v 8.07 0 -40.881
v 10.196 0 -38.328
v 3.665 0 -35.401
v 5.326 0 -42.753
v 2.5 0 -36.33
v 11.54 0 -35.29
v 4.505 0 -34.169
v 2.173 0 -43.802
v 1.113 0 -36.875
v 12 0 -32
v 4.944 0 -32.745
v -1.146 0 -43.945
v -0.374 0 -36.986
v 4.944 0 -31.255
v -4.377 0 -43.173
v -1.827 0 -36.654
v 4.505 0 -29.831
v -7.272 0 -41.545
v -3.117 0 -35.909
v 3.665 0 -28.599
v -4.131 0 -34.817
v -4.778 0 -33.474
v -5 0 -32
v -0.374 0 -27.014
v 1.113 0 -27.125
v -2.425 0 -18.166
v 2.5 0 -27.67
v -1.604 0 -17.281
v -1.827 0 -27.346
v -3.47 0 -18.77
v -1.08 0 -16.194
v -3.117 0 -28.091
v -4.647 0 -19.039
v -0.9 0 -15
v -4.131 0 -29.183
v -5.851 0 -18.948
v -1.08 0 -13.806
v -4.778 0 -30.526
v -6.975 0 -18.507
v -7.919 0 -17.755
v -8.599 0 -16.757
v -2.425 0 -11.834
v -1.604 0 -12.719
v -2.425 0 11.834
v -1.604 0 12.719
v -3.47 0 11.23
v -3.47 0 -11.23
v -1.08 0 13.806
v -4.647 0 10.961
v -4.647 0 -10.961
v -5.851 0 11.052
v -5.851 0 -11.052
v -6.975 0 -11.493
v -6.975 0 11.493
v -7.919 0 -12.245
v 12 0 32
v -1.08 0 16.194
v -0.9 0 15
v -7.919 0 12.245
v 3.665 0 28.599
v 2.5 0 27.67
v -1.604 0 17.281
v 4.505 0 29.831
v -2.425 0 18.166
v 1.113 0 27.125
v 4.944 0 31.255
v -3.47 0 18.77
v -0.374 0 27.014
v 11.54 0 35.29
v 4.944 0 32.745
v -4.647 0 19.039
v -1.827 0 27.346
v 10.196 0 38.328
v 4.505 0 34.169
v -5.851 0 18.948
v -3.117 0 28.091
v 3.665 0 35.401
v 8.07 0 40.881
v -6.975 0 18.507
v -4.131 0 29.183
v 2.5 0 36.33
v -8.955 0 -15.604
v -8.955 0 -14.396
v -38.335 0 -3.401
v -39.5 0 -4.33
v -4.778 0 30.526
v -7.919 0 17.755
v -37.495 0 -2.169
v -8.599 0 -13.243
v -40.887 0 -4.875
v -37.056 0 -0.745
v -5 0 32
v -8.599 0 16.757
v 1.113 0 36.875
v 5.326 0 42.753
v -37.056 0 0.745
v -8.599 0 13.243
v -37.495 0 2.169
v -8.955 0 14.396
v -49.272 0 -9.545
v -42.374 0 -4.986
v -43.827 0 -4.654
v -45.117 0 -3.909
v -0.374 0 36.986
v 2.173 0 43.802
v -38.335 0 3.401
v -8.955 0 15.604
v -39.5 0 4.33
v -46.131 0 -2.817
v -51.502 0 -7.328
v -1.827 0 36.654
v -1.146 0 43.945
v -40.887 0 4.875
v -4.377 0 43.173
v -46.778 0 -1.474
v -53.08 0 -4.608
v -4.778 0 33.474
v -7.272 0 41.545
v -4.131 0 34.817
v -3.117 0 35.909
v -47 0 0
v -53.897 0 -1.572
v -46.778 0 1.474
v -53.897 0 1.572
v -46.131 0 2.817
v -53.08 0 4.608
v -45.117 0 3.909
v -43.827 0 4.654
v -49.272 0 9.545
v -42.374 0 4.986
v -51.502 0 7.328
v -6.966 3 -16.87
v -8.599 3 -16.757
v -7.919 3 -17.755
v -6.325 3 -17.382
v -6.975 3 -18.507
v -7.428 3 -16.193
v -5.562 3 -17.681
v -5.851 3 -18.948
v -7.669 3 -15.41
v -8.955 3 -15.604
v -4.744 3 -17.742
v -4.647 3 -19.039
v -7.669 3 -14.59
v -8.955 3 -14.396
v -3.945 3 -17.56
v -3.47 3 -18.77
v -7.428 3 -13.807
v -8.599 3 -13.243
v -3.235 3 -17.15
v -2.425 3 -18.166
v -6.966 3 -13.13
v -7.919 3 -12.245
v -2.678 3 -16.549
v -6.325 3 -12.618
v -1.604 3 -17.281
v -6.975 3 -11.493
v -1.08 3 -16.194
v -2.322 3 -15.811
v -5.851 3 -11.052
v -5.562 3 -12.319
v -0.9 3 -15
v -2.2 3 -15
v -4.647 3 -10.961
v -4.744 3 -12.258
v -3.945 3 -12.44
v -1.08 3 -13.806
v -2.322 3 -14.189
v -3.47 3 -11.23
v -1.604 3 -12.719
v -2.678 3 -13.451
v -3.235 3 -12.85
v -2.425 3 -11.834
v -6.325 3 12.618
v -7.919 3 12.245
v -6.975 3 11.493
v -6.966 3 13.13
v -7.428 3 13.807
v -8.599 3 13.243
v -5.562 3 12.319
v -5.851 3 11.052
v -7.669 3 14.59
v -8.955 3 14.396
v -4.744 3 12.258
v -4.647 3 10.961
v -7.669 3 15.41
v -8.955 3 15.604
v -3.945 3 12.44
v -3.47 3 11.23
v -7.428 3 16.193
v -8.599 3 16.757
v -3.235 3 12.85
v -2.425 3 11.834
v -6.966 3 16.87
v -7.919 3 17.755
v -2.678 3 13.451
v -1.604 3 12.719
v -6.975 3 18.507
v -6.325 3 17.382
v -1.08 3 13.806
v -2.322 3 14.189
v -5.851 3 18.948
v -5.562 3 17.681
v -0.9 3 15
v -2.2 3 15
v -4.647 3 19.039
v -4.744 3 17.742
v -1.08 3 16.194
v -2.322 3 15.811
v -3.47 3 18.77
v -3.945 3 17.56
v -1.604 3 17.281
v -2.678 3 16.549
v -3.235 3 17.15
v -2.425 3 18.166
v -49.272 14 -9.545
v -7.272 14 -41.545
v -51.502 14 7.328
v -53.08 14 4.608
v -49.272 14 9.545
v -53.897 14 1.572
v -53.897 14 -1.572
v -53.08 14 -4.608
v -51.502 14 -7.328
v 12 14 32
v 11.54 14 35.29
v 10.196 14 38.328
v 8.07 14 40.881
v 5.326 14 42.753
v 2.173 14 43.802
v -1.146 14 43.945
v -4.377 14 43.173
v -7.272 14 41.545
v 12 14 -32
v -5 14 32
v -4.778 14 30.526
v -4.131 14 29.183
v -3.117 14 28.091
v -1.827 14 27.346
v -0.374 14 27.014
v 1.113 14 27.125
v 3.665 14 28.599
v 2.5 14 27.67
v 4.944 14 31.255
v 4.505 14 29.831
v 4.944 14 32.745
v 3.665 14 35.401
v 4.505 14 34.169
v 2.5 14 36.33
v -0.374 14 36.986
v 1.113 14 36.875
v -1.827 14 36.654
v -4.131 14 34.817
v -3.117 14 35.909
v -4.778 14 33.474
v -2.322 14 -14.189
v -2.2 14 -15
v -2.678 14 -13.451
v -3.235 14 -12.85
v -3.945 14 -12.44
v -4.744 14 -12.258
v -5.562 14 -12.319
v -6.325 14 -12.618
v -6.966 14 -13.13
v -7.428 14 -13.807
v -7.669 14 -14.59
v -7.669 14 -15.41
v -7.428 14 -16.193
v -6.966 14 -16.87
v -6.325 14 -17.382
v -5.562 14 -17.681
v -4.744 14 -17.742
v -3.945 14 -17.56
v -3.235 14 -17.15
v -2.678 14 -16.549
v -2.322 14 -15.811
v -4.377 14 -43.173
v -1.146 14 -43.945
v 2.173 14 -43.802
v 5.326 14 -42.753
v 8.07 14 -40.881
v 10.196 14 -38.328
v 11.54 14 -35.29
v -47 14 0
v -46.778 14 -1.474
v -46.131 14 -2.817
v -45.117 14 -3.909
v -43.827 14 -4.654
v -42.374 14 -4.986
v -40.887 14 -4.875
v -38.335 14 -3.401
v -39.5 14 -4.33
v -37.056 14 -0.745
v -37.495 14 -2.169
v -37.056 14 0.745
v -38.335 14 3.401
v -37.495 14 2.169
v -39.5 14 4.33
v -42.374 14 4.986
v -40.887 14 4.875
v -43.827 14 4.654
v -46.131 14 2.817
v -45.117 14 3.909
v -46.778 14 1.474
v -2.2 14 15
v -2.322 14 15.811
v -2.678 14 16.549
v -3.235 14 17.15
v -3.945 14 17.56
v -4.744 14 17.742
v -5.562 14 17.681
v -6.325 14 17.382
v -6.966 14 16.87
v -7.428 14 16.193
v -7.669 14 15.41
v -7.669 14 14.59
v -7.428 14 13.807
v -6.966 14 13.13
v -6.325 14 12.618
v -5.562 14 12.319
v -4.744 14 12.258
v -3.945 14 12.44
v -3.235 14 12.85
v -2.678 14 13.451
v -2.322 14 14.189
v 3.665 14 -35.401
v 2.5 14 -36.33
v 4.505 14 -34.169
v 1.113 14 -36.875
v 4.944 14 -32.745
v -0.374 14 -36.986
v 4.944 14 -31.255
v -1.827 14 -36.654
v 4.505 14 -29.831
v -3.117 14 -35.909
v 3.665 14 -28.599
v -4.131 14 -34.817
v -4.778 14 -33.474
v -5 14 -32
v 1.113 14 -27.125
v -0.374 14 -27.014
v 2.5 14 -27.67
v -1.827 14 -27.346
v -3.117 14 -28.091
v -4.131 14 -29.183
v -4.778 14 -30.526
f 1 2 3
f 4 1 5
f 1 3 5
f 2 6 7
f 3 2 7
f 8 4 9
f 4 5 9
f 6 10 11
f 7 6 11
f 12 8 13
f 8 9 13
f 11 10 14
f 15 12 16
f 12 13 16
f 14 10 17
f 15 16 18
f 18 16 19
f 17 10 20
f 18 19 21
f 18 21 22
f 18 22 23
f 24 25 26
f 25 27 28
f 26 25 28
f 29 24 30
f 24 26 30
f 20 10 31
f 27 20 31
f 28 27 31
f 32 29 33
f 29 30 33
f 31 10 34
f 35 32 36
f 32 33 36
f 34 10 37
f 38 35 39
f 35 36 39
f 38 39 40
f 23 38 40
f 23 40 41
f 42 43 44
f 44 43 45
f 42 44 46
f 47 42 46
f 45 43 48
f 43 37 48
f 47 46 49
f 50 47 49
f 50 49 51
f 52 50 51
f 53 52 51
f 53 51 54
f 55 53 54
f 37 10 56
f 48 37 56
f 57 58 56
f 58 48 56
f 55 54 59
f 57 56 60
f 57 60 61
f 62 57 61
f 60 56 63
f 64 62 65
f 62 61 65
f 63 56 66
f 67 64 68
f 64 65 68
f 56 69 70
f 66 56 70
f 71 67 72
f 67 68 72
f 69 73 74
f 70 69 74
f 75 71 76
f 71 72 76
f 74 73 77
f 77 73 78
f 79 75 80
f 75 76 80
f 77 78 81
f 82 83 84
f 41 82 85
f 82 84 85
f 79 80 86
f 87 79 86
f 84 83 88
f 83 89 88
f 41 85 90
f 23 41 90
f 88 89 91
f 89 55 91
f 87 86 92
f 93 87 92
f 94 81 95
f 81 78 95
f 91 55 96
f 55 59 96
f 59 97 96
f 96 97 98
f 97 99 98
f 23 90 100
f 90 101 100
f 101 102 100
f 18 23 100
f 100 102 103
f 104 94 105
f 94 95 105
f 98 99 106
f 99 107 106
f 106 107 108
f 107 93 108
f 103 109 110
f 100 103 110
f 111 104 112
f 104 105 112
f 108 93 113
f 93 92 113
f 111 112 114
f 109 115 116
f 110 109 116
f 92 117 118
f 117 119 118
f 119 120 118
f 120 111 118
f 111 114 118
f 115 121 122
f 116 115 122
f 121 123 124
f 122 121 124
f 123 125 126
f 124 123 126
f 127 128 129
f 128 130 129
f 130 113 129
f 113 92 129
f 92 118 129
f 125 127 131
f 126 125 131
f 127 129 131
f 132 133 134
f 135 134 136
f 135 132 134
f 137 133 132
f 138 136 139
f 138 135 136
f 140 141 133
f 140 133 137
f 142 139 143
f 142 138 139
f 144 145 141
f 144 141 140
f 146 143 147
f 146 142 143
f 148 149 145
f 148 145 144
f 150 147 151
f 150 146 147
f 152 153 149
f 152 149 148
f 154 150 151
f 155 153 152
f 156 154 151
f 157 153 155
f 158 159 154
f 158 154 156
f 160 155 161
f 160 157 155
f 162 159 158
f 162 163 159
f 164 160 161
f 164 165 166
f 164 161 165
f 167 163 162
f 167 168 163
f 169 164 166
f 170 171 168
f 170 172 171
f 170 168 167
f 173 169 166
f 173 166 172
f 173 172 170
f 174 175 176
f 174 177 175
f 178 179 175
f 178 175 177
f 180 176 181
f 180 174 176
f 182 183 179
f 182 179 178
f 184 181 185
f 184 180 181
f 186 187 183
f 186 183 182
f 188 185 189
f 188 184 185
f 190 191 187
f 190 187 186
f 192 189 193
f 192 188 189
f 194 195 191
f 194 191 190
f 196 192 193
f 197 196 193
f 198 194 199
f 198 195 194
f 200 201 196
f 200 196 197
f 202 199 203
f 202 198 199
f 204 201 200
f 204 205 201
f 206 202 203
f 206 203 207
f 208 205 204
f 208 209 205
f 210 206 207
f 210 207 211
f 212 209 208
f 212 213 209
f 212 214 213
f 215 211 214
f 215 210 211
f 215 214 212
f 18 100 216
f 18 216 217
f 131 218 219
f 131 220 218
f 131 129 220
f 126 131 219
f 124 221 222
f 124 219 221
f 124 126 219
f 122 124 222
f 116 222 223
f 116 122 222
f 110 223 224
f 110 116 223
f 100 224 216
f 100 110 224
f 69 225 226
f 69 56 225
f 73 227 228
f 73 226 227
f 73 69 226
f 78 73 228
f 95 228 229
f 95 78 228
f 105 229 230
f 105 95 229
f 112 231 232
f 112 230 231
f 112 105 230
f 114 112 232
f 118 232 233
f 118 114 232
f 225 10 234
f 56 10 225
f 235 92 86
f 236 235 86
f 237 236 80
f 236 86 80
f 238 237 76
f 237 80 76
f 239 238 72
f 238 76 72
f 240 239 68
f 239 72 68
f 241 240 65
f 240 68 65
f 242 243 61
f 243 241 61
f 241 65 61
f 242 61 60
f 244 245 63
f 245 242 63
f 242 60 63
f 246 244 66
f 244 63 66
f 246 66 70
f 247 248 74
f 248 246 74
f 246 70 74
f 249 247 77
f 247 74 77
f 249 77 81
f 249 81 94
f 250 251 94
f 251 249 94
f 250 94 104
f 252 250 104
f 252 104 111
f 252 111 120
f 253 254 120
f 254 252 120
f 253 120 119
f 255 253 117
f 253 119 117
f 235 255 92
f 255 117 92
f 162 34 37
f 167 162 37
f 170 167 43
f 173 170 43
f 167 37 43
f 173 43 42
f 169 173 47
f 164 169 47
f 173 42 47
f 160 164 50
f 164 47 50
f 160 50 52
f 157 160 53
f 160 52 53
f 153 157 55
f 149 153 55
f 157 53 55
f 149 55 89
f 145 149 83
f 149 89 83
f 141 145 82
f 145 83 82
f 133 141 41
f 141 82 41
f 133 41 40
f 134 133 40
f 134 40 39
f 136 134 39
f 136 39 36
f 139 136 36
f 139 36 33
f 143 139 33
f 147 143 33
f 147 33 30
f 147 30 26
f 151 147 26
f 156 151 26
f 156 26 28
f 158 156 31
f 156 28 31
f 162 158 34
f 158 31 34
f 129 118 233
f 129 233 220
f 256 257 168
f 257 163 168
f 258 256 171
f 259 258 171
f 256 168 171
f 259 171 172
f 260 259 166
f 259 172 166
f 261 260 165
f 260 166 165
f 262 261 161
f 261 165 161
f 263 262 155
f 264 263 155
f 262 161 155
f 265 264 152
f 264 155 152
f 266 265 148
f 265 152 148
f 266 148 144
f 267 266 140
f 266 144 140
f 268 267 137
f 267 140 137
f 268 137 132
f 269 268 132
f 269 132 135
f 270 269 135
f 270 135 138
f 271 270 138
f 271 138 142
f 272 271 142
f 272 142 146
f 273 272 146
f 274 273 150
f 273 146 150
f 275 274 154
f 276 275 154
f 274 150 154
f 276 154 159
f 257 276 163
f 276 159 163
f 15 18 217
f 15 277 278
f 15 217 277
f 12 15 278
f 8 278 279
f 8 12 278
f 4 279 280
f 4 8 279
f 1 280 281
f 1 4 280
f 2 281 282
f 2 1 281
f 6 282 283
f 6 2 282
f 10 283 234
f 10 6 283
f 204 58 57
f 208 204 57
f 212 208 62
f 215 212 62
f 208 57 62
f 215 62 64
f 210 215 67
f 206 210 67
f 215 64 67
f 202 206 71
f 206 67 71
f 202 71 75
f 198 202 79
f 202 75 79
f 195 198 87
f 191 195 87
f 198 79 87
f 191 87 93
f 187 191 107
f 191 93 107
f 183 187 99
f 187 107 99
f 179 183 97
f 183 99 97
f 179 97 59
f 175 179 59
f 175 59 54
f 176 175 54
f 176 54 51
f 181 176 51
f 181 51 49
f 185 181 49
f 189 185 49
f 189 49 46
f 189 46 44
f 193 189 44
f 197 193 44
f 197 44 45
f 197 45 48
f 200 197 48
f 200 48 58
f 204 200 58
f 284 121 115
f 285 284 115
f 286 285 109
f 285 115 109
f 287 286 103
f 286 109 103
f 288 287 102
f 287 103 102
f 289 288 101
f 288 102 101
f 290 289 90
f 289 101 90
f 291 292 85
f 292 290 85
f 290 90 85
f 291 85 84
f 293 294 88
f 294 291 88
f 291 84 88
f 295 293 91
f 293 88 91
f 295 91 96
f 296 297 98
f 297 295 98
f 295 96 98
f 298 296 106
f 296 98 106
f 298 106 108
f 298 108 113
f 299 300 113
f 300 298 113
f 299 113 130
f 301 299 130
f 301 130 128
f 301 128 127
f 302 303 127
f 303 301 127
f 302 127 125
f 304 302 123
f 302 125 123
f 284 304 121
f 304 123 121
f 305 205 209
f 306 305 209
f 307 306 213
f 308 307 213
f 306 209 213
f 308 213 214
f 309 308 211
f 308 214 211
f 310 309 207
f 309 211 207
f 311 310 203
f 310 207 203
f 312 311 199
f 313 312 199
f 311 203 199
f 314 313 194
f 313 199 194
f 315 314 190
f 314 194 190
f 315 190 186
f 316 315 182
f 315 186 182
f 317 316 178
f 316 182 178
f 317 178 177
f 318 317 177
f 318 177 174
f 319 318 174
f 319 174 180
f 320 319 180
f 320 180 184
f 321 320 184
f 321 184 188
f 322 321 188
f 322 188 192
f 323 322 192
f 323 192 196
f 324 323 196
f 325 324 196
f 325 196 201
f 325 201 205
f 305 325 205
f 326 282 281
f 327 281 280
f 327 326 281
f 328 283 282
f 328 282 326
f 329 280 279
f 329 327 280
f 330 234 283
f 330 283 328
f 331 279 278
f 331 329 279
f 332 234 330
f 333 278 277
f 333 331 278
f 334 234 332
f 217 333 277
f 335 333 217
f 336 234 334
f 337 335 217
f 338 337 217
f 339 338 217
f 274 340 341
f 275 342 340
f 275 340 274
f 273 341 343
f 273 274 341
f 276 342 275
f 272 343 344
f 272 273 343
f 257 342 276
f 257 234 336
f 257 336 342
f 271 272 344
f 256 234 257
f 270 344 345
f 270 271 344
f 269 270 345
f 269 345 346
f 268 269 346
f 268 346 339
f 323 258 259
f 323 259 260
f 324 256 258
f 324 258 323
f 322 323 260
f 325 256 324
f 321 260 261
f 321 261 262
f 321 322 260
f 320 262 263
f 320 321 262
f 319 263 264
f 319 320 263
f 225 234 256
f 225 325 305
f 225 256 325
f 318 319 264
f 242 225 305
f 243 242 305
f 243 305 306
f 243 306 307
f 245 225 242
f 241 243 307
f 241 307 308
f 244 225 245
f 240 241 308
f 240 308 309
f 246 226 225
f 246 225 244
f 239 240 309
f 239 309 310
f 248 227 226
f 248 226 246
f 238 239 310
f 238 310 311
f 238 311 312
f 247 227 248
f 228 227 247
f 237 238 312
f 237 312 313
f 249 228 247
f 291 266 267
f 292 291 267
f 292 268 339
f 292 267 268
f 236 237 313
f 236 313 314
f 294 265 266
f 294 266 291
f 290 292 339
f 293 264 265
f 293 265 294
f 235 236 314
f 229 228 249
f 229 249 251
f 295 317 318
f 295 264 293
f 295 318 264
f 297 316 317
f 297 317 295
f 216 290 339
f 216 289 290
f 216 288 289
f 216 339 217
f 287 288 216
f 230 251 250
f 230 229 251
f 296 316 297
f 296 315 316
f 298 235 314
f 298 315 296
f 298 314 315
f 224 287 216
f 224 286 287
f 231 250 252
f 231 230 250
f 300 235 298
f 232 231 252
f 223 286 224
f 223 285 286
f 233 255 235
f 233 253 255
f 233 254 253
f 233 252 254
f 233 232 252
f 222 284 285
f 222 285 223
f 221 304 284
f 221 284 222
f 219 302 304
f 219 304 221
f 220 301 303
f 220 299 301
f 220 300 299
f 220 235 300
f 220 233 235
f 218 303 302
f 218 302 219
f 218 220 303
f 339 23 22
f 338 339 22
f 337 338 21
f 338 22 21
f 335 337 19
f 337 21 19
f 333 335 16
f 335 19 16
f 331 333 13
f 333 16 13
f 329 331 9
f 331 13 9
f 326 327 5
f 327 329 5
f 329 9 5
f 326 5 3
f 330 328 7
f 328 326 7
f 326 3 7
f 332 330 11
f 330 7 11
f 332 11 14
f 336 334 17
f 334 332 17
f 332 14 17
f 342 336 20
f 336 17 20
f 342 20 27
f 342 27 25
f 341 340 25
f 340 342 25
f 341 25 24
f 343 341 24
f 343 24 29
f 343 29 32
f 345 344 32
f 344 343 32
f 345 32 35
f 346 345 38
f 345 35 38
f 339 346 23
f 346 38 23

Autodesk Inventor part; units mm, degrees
ref_plane "YZ Plane" through (0, 0, 0) normal (1, 0, 0) x (0, 1, 0)
ref_plane "XZ Plane" through (0, 0, 0) normal (0, 1, 0) x (-1, 0, 0)
ref_plane "XY Plane" through (0, 0, 0) normal (0, 0, 1) x (1, 0, 0)
sketch "Sketch1" plane through (0, 0, 0) normal (0, 1, 0) x (-1, 0, 0)
  circle A0 centre (0, 32) radius 5
  circle A1 centre (0, -32) radius 5
  circle A2 centre (42, 0) radius 5
  circle A3 centre (0, -32) radius 12 construction
  circle A4 centre (42, 0) radius 12 construction
  circle A5 centre (0, 32) radius 12 construction
  line L0 (-12, -32) -> (-12, 32)
  line L1 (7.2725, 41.5452) -> (49.2725, 9.5452)
  line L2 (49.2725, -9.5452) -> (7.2725, -41.5452)
  arc A6 (7.2725, 41.5452) -> (-12, 32) centre (0, 32) ccw
  arc A7 (-12, -32) -> (7.2725, -41.5452) centre (0, -32) ccw
  arc A8 (49.2725, -9.5452) -> (49.2725, 9.5452) centre (42, 0) ccw
  point P0 (0, 0)
  dimension "d0" = 10
  dimension "d1" = 64
  dimension "d2" = 32
  dimension "d3" = 24
  dimension "d4" = 42
extrude "Extrusion1" add sketch "Sketch1" along normal blind 14
sketch "Sketch3" plane through (0, 0, 0) normal (0, -1, 0) x (1, 0, 0)
  line L0 (-49.2725, 9.5452) -> (-7.2725, 41.5452) construction
  arc A0 (-49.2725, 9.5452) -> (-49.2725, -9.5452) centre (-42, 0) ccw construction
  line L1 (-7.2725, -41.5452) -> (-49.2725, -9.5452) construction
  arc A1 (-7.2725, -41.5452) -> (12, -32) centre (0, -32) ccw construction
  line L2 (12, 32) -> (12, -32) construction
  arc A2 (12, 32) -> (-7.2725, 41.5452) centre (0, 32) ccw construction
  circle A3 centre (-42, 0) radius 5 construction
  circle A4 centre (0, -32) radius 5 construction
  circle A5 centre (0, 32) radius 5 construction
  line L3 (12, 32) -> (12, -32) construction
  line L4 (12, 0) -> (-42, 0) construction
  line L5 (12, 20) -> (2, 20) construction
  line L6 (2, 20) -> (2, -20) construction
  line L7 (2, -20) -> (12, -20) construction
  line L8 (12, -20) -> (12, 20) construction
  circle A6 centre (-4.95, -15) radius 2.75
  circle A7 centre (-4.95, 15) radius 2.75
  point P0 (0, 0)
  point P1 (7, -20)
  dimension "d7" = 10
  dimension "d8" = 40
  dimension "d9" = 5.5
  dimension "d10" = 5
  dimension "d11" = 6.95
extrude "Extrusion2" cut sketch "Sketch3" against normal through all
sketch "Sketch4" plane through (0, 0, 0) normal (0, -1, 0) x (1, 0, 0)
  circle A0 centre (-4.95, -15) radius 2.75 construction
  circle A1 centre (-4.95, 15) radius 2.75 construction
  line L0 (-49.2725, 9.5452) -> (-7.2725, 41.5452) construction
  arc A2 (-49.2725, 9.5452) -> (-49.2725, -9.5452) centre (-42, 0) ccw construction
  line L1 (-7.2725, -41.5452) -> (-49.2725, -9.5452) construction
  arc A3 (-7.2725, -41.5452) -> (12, -32) centre (0, -32) ccw construction
  line L2 (12, 32) -> (12, -32) construction
  arc A4 (12, 32) -> (-7.2725, 41.5452) centre (0, 32) ccw construction
  circle A5 centre (-42, 0) radius 5 construction
  circle A6 centre (0, -32) radius 5 construction
  circle A7 centre (0, 32) radius 5 construction
  circle A8 centre (-4.95, 15) radius 4.05
  line L3 (-42, 0) -> (0, 0) construction
  circle A9 centre (-4.95, -15) radius 4.05
  dimension "d14" = 8.1
extrude "Extrusion3" cut sketch "Sketch4" against normal blind 3
equation "\"d2\" = 0.5 * d1"
properties part number "base_obj4"
